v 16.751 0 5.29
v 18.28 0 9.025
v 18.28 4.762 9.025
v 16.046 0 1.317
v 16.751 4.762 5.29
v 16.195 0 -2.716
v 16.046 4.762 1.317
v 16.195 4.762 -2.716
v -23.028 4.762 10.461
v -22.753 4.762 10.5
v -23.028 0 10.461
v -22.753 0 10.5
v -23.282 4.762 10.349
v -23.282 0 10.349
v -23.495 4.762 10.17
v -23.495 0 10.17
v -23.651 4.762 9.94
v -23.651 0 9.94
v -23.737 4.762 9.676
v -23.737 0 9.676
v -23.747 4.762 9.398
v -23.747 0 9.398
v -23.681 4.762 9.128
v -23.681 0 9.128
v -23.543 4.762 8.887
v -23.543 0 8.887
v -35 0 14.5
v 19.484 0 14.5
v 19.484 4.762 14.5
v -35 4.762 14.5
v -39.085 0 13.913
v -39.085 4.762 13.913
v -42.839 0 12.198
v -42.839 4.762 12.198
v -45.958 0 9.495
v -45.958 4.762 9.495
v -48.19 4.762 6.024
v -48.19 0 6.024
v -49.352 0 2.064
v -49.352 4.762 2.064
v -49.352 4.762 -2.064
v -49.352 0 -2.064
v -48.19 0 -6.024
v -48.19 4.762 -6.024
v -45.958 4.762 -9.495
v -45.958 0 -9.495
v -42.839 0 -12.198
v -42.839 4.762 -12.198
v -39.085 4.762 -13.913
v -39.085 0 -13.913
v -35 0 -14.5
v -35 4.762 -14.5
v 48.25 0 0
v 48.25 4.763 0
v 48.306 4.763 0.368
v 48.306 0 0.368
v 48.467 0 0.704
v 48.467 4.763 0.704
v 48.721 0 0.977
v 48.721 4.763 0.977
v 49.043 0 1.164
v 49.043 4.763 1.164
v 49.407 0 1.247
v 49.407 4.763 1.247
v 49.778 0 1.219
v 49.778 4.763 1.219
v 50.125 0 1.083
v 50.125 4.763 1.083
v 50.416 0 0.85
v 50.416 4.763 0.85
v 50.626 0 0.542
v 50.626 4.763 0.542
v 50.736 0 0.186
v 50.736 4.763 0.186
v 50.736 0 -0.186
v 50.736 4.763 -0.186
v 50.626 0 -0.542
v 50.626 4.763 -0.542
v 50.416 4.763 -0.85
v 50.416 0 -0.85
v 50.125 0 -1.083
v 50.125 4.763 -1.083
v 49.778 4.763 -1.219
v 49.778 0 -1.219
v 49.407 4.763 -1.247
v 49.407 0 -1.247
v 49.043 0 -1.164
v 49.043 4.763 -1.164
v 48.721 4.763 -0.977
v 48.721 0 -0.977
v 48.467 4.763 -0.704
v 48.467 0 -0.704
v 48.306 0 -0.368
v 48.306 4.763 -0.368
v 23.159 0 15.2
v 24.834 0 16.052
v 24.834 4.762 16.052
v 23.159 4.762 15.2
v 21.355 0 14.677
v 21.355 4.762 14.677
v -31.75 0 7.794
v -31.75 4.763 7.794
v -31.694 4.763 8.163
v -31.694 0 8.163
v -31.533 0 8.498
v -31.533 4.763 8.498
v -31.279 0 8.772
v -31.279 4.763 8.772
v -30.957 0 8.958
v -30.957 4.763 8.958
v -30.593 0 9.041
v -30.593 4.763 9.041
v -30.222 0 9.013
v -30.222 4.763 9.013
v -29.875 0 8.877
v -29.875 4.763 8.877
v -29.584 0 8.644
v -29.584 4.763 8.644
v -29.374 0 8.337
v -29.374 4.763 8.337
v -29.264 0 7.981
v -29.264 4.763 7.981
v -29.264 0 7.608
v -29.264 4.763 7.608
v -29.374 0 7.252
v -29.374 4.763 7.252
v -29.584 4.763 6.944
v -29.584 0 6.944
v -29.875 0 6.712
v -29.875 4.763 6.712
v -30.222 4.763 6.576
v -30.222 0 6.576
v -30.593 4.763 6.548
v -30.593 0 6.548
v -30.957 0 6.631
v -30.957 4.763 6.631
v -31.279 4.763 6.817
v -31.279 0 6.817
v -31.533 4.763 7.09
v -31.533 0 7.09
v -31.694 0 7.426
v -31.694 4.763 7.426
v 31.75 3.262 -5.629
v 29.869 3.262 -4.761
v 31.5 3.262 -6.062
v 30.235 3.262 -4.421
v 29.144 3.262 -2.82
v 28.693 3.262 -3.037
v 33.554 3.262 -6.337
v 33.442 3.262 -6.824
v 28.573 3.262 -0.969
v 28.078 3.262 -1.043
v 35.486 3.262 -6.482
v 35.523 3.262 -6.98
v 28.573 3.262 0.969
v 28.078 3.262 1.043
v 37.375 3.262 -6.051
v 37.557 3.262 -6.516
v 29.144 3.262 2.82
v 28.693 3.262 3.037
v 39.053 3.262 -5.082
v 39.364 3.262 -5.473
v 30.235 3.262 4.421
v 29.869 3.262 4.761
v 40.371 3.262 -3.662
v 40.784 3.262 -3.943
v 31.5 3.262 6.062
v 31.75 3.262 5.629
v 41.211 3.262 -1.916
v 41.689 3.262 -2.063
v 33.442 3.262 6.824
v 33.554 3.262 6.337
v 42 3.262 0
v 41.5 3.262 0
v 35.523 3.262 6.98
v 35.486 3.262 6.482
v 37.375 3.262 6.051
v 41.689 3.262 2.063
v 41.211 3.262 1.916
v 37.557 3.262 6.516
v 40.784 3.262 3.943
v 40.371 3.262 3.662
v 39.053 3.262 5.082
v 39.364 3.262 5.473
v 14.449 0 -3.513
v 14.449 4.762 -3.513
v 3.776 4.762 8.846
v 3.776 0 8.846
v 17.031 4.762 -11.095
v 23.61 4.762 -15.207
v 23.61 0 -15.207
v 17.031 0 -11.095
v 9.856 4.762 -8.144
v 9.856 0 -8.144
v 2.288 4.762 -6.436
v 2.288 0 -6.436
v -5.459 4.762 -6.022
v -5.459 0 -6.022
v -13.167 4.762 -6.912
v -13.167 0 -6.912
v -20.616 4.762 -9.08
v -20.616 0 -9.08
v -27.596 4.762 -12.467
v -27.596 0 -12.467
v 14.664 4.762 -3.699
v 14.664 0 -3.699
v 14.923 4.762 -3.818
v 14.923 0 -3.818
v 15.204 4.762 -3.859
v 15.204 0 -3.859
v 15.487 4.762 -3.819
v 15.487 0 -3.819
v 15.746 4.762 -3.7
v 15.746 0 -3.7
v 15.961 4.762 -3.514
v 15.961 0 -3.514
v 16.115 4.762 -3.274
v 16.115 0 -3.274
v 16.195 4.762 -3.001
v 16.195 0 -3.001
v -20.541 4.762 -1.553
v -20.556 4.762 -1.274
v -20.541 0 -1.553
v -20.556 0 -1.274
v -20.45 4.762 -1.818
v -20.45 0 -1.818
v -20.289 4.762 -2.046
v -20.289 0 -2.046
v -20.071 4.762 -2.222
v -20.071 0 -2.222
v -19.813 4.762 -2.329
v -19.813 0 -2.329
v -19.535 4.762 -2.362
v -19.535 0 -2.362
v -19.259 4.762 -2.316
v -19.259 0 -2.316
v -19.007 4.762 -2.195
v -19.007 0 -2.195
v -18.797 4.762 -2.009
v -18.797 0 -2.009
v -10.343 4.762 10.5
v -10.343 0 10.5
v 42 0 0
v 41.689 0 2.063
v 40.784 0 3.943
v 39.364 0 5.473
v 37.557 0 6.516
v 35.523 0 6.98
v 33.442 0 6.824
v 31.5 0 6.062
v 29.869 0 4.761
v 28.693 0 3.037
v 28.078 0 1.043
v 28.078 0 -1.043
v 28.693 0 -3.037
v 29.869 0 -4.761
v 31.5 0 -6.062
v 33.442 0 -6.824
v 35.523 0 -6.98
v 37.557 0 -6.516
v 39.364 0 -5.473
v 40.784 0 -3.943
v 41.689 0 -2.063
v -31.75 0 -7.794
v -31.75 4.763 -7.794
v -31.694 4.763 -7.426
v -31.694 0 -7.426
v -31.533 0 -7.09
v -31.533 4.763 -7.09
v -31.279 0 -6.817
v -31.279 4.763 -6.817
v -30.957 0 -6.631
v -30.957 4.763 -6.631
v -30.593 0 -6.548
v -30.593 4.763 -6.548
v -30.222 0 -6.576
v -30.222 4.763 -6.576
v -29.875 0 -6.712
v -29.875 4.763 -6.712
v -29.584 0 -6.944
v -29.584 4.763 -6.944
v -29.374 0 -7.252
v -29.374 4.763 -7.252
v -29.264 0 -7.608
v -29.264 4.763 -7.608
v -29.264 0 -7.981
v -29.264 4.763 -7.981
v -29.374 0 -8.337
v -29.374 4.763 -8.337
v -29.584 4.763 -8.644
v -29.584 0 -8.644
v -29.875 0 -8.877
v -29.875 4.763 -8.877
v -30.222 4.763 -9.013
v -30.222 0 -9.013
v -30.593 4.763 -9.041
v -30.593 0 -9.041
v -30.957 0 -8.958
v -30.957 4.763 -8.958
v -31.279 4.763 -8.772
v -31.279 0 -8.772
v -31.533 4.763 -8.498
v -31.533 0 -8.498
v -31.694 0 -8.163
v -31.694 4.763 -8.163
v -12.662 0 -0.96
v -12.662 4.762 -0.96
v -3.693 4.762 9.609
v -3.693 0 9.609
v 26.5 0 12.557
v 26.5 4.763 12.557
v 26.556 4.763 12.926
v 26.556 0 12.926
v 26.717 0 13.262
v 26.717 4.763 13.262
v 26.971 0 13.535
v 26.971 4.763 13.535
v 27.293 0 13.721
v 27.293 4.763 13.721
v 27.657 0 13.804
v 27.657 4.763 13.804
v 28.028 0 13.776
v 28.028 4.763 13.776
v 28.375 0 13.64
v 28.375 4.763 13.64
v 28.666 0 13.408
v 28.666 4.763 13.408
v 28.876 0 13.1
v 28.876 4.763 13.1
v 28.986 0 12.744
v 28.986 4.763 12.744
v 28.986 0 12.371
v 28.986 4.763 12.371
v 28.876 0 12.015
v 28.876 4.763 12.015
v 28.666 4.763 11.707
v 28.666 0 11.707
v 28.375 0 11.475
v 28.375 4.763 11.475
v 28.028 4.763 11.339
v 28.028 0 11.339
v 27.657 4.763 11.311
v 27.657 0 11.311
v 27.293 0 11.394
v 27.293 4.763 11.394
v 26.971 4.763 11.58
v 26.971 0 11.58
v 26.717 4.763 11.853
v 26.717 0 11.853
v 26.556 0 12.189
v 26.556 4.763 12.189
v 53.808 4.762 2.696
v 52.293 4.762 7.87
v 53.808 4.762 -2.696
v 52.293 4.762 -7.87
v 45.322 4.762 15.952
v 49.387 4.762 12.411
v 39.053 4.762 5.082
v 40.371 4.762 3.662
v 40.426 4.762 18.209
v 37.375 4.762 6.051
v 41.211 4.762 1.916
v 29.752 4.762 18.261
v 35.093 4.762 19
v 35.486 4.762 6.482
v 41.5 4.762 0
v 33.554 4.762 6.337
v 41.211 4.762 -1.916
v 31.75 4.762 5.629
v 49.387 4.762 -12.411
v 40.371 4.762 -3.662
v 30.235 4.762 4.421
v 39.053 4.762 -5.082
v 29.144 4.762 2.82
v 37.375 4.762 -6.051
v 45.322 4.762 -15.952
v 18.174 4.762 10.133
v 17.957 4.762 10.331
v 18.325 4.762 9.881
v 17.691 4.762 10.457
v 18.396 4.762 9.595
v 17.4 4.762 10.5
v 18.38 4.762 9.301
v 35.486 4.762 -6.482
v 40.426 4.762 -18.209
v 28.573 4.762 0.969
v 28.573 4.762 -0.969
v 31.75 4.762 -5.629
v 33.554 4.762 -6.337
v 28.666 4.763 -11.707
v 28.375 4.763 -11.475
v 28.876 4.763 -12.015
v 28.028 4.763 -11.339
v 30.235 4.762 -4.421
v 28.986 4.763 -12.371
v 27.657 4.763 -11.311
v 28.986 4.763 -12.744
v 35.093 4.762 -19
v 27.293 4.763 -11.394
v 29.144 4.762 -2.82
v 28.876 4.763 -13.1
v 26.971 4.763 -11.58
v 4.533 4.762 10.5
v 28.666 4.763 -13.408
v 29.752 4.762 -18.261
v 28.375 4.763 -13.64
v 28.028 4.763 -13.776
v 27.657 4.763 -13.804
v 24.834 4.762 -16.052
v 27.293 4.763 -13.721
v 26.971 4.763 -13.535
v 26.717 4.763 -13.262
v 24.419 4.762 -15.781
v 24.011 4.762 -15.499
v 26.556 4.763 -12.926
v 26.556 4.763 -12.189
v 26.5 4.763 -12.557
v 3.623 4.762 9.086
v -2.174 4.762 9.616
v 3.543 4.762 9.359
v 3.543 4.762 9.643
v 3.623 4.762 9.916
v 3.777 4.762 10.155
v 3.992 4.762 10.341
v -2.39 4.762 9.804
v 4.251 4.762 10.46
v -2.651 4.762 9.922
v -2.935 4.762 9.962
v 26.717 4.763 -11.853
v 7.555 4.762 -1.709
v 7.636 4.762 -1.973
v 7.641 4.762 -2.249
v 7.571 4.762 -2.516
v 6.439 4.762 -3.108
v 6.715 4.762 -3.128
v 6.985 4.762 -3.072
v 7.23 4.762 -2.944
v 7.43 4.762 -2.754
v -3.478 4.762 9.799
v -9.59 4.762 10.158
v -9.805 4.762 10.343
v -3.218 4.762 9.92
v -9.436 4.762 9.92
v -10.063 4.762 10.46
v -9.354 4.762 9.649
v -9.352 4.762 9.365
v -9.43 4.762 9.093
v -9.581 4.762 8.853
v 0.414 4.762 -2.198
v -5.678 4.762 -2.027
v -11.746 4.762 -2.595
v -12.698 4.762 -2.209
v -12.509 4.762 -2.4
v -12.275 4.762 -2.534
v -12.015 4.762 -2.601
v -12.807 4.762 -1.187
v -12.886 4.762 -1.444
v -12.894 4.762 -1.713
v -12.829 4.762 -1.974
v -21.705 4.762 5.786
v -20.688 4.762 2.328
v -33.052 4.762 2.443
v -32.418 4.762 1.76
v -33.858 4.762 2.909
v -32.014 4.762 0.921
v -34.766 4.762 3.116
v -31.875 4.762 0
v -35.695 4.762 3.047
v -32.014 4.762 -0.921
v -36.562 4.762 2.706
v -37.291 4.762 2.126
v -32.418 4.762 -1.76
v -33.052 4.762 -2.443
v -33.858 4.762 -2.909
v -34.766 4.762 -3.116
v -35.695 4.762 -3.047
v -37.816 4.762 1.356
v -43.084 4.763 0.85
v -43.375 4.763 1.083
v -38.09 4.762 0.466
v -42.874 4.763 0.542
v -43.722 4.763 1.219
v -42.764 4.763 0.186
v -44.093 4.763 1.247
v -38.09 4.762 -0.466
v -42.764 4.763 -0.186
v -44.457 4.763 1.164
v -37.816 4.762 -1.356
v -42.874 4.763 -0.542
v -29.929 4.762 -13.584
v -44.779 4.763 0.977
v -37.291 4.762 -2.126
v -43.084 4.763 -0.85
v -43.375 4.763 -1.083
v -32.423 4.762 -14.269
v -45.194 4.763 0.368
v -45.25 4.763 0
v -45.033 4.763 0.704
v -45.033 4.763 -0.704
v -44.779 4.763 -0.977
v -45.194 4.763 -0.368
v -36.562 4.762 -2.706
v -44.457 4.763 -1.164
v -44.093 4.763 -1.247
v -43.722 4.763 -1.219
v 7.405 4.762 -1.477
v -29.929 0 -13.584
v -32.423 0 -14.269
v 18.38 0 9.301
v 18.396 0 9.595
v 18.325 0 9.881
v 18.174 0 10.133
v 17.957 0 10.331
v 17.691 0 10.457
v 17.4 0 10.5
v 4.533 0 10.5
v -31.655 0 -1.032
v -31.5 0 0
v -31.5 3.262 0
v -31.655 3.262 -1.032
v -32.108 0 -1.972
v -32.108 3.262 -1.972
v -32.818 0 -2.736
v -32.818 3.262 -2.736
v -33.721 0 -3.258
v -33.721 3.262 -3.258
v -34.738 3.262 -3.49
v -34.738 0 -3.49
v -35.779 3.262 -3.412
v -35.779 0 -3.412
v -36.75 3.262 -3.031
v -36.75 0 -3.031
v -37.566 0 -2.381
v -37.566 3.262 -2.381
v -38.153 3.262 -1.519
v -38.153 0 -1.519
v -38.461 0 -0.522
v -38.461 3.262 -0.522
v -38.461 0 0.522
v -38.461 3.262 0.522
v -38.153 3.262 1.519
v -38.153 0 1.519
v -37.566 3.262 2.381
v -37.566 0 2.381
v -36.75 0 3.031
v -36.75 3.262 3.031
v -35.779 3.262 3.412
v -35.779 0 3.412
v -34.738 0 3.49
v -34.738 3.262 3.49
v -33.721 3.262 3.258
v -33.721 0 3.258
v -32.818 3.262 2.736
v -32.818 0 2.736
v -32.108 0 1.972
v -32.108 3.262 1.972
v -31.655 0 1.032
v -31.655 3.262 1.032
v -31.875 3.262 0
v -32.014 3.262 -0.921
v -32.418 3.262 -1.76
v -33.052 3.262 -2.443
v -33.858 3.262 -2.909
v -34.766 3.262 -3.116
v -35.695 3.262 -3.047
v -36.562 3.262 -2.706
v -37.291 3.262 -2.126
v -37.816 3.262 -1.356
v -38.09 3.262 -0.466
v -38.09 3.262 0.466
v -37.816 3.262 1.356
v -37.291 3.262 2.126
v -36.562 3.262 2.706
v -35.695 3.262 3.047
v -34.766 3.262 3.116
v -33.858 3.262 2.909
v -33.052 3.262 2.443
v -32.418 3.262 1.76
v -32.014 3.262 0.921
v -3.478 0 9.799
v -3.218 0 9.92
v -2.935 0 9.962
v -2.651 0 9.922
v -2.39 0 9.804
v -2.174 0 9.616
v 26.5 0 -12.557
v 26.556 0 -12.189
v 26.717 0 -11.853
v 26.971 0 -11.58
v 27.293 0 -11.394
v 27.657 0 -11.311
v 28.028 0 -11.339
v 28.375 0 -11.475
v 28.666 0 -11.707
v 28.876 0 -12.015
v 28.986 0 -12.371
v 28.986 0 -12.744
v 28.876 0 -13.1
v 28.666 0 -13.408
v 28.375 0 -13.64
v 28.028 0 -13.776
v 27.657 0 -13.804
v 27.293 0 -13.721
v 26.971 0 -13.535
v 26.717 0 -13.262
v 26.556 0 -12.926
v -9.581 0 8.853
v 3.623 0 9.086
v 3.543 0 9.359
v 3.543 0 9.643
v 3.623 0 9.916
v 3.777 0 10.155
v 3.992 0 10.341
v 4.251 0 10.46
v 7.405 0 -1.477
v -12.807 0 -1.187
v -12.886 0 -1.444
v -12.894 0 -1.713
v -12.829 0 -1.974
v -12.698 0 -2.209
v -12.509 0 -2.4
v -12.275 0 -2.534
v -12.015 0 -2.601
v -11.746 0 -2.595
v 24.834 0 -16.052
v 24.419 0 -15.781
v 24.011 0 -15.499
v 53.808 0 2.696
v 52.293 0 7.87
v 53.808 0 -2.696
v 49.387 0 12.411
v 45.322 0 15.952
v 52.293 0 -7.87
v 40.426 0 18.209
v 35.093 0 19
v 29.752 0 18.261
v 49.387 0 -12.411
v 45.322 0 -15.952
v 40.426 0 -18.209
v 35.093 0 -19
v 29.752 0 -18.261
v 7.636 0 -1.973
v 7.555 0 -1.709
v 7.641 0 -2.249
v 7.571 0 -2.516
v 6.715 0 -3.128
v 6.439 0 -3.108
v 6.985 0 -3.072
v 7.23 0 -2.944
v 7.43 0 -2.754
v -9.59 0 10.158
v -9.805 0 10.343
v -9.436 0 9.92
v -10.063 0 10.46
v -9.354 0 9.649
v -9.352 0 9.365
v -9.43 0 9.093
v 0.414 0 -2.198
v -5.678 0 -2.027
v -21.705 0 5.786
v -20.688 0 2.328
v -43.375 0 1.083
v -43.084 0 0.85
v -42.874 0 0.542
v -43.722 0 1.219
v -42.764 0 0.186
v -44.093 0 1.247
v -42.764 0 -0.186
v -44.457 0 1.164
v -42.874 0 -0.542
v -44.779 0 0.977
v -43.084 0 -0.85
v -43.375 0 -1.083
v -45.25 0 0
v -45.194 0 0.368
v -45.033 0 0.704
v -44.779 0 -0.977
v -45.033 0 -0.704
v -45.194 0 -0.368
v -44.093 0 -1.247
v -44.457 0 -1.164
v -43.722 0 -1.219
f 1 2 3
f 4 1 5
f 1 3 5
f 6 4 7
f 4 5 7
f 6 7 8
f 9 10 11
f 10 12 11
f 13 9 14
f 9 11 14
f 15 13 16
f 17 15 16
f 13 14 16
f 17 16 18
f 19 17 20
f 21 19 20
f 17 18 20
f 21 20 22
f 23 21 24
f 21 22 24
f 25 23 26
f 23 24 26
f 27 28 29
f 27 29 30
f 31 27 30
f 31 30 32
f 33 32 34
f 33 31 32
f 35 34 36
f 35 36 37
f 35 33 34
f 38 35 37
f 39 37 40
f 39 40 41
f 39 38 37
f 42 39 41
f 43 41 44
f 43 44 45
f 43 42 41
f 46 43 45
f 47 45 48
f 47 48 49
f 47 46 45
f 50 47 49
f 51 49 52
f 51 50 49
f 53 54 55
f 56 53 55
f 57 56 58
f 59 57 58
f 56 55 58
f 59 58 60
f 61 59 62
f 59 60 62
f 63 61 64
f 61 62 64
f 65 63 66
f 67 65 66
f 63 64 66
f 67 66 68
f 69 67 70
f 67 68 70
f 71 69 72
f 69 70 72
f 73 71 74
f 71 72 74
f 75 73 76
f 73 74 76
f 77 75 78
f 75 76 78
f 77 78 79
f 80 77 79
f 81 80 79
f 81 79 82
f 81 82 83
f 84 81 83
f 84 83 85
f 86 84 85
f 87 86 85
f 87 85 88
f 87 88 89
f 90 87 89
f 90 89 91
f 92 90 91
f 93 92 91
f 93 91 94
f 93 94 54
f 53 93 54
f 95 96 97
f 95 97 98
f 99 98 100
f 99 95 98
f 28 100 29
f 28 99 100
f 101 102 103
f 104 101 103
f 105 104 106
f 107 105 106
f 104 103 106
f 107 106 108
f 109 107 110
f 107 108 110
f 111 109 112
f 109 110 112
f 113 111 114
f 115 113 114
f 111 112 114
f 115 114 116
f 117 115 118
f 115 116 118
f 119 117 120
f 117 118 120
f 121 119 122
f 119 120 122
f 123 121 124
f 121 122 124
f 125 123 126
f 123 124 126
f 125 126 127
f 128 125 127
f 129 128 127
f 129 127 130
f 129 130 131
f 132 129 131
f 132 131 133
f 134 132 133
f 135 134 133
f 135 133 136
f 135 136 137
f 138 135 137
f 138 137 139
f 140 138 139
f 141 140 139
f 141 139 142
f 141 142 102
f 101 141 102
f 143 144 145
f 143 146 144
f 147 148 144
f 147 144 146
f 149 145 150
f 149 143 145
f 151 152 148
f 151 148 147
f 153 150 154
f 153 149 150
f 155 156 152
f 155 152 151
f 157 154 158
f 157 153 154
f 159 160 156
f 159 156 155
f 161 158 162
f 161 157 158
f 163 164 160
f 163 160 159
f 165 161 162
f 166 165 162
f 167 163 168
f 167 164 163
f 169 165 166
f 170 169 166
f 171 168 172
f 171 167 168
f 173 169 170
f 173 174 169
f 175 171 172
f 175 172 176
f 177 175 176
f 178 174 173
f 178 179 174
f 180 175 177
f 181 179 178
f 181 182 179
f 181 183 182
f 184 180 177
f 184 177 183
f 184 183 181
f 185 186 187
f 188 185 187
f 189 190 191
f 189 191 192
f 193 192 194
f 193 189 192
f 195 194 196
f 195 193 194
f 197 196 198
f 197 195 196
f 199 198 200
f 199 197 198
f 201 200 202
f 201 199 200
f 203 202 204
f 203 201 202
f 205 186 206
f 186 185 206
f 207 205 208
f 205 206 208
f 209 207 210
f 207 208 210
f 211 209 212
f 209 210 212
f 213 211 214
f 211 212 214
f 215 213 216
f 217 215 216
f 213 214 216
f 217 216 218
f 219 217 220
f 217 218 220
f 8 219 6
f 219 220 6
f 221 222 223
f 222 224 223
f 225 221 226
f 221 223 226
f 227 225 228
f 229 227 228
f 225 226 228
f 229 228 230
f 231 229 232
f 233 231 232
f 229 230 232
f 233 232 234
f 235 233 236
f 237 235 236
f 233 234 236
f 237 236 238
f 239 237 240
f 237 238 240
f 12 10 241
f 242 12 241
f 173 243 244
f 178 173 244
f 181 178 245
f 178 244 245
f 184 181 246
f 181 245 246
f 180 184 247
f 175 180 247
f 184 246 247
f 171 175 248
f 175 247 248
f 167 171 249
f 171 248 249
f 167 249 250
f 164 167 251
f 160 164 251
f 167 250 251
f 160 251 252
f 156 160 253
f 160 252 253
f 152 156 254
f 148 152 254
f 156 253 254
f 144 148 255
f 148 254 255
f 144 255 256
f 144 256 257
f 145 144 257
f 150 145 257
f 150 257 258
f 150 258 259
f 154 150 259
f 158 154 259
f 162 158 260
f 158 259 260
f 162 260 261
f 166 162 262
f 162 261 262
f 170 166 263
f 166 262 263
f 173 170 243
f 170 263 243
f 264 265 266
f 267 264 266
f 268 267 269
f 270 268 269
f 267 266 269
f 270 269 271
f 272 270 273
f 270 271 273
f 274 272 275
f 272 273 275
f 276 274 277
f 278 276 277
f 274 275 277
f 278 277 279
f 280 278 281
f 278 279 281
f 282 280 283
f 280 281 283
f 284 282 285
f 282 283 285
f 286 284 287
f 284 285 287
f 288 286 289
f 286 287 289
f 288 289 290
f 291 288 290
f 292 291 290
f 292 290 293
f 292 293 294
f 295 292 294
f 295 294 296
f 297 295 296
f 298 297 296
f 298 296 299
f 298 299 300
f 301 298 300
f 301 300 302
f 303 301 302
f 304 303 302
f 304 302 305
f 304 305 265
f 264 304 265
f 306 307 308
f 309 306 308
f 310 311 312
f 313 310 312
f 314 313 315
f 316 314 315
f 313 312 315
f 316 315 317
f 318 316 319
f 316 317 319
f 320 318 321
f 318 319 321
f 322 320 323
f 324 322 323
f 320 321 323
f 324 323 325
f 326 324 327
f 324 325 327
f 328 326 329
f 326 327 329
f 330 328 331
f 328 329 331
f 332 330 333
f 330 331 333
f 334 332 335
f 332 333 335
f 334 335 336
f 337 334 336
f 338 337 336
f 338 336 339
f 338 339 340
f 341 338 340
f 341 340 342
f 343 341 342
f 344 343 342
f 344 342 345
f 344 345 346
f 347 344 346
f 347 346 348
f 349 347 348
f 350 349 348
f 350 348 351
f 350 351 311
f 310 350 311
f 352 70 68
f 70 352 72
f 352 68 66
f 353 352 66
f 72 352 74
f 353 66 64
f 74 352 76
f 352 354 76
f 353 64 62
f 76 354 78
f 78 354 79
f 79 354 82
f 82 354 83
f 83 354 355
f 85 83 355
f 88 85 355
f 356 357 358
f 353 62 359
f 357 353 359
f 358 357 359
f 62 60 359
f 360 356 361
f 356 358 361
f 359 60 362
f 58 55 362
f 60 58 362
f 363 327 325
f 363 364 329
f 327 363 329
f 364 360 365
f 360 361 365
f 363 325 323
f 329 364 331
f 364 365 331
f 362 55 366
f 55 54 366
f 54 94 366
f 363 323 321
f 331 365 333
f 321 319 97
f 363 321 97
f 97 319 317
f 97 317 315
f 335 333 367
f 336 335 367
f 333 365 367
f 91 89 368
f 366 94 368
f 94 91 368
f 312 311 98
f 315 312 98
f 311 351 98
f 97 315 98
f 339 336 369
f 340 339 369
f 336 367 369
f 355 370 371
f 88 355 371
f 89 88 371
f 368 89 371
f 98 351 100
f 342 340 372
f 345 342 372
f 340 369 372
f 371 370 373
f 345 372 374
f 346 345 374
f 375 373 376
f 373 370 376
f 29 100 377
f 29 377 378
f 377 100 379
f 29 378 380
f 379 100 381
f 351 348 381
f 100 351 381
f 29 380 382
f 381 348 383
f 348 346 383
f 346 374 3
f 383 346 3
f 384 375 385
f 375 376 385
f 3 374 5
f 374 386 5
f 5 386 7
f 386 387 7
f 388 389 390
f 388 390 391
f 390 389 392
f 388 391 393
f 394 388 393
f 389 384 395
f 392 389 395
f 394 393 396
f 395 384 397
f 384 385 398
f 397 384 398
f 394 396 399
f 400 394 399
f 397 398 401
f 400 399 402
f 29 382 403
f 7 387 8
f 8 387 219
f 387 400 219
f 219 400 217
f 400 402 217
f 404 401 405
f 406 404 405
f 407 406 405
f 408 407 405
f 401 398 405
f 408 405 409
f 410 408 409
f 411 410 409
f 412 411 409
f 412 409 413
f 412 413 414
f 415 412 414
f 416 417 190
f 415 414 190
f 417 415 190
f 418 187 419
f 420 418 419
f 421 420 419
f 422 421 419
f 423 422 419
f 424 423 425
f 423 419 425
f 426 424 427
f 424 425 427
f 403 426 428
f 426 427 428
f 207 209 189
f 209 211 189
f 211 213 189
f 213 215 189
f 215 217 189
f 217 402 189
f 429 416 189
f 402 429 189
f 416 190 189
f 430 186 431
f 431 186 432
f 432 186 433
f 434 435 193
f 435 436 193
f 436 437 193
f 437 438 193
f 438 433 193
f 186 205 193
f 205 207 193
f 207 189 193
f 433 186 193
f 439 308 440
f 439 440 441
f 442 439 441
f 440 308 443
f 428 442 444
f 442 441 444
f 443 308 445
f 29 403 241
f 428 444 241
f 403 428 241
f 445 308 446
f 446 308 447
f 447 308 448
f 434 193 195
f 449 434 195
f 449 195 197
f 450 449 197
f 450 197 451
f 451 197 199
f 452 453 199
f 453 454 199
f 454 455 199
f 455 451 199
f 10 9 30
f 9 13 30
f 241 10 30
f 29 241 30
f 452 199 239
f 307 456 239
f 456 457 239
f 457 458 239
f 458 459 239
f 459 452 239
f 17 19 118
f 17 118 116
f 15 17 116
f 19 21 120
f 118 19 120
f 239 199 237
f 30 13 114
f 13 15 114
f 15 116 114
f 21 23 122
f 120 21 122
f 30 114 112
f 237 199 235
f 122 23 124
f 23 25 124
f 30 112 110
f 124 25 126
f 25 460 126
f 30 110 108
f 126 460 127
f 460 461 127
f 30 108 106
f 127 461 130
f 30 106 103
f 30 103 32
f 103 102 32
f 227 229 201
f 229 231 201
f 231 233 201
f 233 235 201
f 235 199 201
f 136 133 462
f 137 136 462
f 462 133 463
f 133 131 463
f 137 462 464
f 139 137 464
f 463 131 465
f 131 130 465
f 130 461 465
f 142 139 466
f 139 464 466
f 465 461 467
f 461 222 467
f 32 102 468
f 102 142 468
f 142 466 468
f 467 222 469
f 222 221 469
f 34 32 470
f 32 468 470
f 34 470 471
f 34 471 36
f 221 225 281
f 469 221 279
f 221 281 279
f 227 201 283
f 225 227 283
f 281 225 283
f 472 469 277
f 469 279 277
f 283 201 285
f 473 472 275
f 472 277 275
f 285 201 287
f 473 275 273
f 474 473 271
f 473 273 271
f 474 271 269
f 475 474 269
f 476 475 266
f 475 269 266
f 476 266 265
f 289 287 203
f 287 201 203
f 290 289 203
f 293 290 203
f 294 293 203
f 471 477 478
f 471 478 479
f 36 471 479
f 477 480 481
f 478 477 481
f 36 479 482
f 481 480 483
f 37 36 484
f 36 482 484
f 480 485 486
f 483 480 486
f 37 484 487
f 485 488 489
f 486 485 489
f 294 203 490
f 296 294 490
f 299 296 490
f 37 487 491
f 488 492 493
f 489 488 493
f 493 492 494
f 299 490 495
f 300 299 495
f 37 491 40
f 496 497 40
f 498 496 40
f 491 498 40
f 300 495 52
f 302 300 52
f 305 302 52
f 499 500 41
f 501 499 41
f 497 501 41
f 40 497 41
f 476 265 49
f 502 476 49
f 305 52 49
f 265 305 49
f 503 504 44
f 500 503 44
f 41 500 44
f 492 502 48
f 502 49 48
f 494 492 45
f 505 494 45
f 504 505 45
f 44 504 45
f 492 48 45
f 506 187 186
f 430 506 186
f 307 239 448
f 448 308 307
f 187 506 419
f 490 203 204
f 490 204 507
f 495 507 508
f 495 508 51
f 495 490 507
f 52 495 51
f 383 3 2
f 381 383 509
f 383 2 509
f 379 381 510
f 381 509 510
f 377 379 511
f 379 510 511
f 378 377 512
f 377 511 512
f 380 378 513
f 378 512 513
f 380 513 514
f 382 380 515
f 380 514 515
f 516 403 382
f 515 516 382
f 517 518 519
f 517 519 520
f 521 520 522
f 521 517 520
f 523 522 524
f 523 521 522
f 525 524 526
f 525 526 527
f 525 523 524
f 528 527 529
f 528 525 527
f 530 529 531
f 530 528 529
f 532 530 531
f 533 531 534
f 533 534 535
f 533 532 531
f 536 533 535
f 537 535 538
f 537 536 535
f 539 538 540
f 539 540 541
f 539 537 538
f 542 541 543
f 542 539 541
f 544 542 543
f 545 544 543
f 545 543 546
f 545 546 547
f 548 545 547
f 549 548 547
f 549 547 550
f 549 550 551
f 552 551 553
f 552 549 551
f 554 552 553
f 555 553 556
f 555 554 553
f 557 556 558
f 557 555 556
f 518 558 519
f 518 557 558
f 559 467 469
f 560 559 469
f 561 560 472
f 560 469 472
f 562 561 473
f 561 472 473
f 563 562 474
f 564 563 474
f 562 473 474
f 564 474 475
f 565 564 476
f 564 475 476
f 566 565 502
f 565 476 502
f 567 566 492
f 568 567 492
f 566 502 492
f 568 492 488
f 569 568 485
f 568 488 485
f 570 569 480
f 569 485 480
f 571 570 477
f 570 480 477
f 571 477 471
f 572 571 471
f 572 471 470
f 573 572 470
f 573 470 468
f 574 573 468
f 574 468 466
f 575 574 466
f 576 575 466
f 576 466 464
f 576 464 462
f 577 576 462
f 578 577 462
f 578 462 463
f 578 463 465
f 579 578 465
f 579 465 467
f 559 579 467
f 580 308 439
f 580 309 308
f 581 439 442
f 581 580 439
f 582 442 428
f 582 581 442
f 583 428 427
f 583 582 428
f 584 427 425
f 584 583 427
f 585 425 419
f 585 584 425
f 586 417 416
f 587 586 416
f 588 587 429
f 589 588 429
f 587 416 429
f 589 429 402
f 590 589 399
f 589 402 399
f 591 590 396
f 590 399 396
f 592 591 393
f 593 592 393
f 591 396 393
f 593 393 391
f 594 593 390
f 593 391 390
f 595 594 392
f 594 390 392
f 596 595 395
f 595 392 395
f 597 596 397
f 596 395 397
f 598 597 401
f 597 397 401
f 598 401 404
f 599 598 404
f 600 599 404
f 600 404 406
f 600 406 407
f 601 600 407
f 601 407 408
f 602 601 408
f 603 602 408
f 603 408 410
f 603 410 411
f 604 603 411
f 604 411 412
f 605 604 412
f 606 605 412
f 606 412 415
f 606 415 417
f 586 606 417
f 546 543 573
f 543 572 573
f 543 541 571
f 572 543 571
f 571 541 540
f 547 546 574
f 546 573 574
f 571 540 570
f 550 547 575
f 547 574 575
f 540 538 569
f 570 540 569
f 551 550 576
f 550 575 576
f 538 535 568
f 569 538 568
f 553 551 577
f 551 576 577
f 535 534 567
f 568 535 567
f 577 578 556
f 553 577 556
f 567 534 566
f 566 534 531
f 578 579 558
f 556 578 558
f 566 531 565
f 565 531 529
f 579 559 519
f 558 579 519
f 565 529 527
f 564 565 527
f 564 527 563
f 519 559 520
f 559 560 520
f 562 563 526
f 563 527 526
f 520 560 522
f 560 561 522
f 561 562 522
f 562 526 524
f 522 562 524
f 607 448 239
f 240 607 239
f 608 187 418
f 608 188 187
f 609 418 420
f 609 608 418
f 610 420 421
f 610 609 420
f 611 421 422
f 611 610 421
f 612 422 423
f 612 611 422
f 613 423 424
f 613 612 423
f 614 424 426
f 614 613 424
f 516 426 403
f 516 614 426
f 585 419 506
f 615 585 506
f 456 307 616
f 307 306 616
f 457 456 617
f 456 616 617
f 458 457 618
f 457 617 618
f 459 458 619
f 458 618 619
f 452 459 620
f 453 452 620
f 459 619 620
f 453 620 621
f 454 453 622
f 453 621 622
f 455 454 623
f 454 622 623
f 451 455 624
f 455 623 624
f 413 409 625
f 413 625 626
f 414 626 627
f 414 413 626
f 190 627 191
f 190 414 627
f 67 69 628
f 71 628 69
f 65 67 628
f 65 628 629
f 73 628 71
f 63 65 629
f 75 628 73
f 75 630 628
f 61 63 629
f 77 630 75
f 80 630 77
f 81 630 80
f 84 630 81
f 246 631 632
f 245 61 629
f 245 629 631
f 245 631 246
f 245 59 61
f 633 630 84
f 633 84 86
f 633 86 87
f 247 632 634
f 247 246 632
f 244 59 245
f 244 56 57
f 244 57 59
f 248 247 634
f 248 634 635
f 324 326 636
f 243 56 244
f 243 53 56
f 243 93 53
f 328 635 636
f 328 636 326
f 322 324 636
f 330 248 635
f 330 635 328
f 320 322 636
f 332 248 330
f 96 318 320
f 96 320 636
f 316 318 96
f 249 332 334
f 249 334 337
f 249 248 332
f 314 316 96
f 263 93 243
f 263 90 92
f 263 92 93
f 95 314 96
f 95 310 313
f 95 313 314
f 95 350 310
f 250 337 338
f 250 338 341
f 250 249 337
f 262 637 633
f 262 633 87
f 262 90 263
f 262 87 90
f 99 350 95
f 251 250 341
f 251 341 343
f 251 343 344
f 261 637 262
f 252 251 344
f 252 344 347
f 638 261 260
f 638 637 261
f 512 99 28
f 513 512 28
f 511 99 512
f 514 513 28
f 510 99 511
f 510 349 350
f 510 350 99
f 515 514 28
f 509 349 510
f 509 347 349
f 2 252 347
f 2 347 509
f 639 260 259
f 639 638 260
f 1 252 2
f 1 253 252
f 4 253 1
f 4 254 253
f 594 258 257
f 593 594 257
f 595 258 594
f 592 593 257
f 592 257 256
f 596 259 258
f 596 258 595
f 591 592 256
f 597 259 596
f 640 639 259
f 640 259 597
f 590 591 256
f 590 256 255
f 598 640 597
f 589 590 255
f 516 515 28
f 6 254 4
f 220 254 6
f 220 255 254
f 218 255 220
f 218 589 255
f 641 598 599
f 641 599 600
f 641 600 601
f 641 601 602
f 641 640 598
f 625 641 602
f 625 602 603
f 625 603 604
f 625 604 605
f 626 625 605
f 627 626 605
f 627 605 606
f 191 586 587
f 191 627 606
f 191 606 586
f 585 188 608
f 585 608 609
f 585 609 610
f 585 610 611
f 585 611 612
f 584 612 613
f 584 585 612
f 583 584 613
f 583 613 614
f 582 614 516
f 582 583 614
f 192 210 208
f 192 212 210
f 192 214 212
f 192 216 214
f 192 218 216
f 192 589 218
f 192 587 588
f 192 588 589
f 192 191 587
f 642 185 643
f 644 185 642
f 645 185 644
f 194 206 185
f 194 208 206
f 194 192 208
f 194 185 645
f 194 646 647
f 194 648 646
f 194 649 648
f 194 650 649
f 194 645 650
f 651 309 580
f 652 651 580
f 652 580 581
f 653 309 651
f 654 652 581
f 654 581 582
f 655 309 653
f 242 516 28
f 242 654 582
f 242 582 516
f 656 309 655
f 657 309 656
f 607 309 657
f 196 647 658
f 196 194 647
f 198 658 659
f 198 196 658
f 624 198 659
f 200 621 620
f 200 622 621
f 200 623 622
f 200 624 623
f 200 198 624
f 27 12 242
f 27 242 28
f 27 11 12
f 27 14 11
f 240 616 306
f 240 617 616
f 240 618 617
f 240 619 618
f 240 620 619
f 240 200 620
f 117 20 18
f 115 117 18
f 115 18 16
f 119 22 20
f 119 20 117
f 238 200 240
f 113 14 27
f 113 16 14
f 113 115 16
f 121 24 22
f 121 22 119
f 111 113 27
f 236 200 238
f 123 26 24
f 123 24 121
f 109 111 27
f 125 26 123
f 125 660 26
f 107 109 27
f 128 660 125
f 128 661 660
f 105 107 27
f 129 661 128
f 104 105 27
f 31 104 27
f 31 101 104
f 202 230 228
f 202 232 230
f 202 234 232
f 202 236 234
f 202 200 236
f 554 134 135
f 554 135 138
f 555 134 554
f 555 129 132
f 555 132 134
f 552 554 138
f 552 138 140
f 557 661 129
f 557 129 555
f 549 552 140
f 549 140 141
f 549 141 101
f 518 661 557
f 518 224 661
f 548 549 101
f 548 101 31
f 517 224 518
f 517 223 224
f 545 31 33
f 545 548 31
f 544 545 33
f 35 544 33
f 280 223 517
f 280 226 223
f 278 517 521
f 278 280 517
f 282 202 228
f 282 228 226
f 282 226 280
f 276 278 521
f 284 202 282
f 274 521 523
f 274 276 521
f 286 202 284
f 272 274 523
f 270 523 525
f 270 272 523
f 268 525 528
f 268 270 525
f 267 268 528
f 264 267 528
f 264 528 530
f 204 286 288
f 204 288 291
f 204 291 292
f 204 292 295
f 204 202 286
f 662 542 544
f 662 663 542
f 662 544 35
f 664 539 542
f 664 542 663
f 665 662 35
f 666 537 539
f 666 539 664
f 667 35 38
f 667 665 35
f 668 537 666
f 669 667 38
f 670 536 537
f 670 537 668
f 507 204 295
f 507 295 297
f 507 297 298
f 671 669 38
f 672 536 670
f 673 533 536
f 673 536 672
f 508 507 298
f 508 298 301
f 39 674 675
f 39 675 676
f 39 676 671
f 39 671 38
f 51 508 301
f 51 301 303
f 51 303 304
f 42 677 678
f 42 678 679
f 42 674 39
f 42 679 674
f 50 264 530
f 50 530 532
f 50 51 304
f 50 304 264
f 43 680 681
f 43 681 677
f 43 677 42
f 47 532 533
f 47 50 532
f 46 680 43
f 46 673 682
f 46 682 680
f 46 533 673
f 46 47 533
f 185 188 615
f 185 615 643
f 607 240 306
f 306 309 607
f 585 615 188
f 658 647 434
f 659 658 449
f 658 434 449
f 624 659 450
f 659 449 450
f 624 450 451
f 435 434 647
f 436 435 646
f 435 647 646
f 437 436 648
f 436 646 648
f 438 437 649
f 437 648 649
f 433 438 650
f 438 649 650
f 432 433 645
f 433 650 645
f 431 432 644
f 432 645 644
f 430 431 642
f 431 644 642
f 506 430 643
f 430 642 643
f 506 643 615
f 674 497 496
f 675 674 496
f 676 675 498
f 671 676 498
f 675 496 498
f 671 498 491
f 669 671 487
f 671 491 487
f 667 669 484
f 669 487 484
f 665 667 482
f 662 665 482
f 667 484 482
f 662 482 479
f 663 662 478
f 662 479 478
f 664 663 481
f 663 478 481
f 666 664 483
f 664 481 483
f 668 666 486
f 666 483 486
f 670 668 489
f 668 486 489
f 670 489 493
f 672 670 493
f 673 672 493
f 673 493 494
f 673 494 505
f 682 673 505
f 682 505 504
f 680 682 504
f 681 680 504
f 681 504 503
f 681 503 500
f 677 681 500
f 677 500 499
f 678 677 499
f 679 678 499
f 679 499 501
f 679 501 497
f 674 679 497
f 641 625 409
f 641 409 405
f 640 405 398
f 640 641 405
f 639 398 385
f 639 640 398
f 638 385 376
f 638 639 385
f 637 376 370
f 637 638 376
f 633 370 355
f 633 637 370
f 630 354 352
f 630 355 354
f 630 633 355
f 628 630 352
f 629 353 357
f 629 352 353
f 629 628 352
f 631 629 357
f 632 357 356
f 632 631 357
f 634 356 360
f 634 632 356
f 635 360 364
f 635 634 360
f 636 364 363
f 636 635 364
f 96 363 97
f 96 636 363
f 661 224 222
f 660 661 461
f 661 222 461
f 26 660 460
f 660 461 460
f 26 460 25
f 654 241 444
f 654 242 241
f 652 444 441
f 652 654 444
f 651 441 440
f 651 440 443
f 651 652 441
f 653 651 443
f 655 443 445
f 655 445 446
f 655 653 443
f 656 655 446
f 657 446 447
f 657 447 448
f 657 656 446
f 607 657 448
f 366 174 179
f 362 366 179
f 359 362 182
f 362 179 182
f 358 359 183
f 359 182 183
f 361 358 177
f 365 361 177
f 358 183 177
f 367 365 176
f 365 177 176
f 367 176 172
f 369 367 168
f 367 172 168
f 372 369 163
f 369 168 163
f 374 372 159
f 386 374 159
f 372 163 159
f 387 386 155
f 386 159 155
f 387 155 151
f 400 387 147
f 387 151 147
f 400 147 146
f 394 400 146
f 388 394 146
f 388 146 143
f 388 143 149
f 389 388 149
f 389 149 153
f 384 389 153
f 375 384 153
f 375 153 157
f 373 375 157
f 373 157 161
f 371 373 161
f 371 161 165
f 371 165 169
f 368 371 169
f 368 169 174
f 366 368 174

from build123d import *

# Parameters (mm, degrees)
BOSS_EXTRUDE1_DEPTH   = 4.7625
CUT_EXTRUDE1_DEPTH    = 5.7625
CUT_EXTRUDE2_DEPTH    = 5.7625
FILLET1_R             = 1
SKETCH4_R             = 4
BOSS_EXTRUDE3_DEPTH   = 4.7625
SKETCH5_R             = 3.125
CUT_EXTRUDE3_DEPTH    = 5.7625
SKETCH6_R             = 3.5
CUT_EXTRUDE4_DEPTH    = 3.2625
SKETCH7_R             = 6.5
CUT_EXTRUDE5_DEPTH    = 5.7625
SKETCH8_R             = 7
CUT_EXTRUDE6_DEPTH    = 3.2625
M3X0_5_TAPPED_HOLE1_D = 2.5
M3X0_5_TAPPED_HOLE2_D = 2.5


with BuildPart() as part:
    # Sketch1 → Boss-Extrude1 (new body)
    with BuildSketch(Plane(origin=(0, 0, 0), x_dir=(1, 0, 0), z_dir=(0, 1, 0))):
        with BuildLine():
            Line((-35, 14.5), (19.483879351, 14.5))
            ThreePointArc((19.483879351, 14.5), (22.269309423, 14.89576243), (24.834265782, 16.051724138))
            ThreePointArc((24.834265782, 16.051724138), (54, 0), (24.834265782, -16.051724138))
            ThreePointArc((24.834265782, -16.051724138), (22.269309423, -14.89576243), (19.483879351, -14.5))
            Line((19.483879351, -14.5), (-35, -14.5))
            ThreePointArc((-35, -14.5), (-49.5, 0), (-35, 14.5))
        make_face()
    extrude(amount=BOSS_EXTRUDE1_DEPTH)

    # Sketch2 → Cut-Extrude1 (cut, through all)
    with BuildSketch(Plane(origin=(0, 4.7625, 0), x_dir=(1, 0, 0), z_dir=(0, 1, 0))):
        with BuildLine():
            Line((-35, 14.5), (27.609823933, 17.503865221))
            ThreePointArc((27.609823933, 17.503865221), (25.539879113, 16.477442544), (23.609823933, 15.207362991))
            ThreePointArc((23.609823933, 15.207362991), (-1.577083946, 6.065910022), (-27.59576752, 12.467050228))
            ThreePointArc((-27.59576752, 12.467050228), (-31.160874338, 13.98252889), (-35, 14.5))
        make_face()
    extrude(amount=-CUT_EXTRUDE1_DEPTH, mode=Mode.SUBTRACT)

    # Sketch3 → Cut-Extrude2 (cut, through all)
    with BuildSketch(Plane(origin=(0, 4.7625, 0), x_dir=(1, 0, 0), z_dir=(0, 1, 0))):
        with BuildLine():
            Line((-25, -10.5), (-8.18305643, -10.5))
            Line((-8.18305643, -10.5), (-21.431362429, 5.11293208))
            ThreePointArc((-21.431362429, 5.11293208), (-20.86454524, -3.230931556), (-25, -10.5))
        make_face()
        with BuildLine():
            Line((-14.47546762, 3.097845852), (-2.937056907, -10.5))
            Line((-2.937056907, -10.5), (9.456330798, 3.851674059))
            ThreePointArc((9.456330798, 3.851674059), (-2.463897631, 2.02484882), (-14.47546762, 3.097845852))
        make_face()
        with BuildLine():
            Line((17.235698957, 6.740148995), (2.347968808, -10.5))
            Line((2.347968808, -10.5), (19.164912378, -10.5))
            ThreePointArc((19.164912378, -10.5), (16.117854624, -2.112956696), (17.235698957, 6.740148995))
        make_face()
    extrude(amount=-CUT_EXTRUDE2_DEPTH, mode=Mode.SUBTRACT)

    # Fillet1
    fillet1_edges = [part.edges().sort_by_distance(p)[0] for p in [
        (17.235698957, 2.38125, -6.740148995),
        (19.164912378, 2.38125, 10.5),
        (2.347968808, 2.38125, 10.5),
        (-21.431362429, 2.38125, -5.11293208),
        (-8.18305643, 2.38125, 10.5),
        (-25, 2.38125, 10.5),
        (-14.47546762, 2.38125, -3.097845852),
        (9.456330798, 2.38125, -3.851674059),
        (-2.937056907, 2.38125, 10.5),
    ]]
    fillet(fillet1_edges, radius=FILLET1_R)

    # Sketch4 → Boss-Extrude3 (add, through all)
    with BuildSketch(Plane(origin=(0, 4.7625, 0), x_dir=(1, 0, 0), z_dir=(0, 1, 0))):
        with Locations((-35, 0)):
            Circle(SKETCH4_R)
    extrude(amount=-BOSS_EXTRUDE3_DEPTH)

    # Sketch5 → Cut-Extrude3 (cut, through all)
    with BuildSketch(Plane(origin=(0, 4.7625, 0), x_dir=(1, 0, 0), z_dir=(0, 1, 0))):
        with Locations((-35, 0)):
            Circle(SKETCH5_R)
    extrude(amount=-CUT_EXTRUDE3_DEPTH, mode=Mode.SUBTRACT)

    # Sketch6 → Cut-Extrude4 (cut)
    with BuildSketch(Plane(origin=(0, 0, 0), x_dir=(1, 0, 0), z_dir=(0, 1, 0))):
        with Locations((-35, 0)):
            Circle(SKETCH6_R)
    extrude(amount=CUT_EXTRUDE4_DEPTH, mode=Mode.SUBTRACT)

    # Sketch7 → Cut-Extrude5 (cut, through all)
    with BuildSketch(Plane.XZ):
        with Locations((35, 0)):
            Circle(SKETCH7_R)
    extrude(amount=-CUT_EXTRUDE5_DEPTH, mode=Mode.SUBTRACT)

    # Sketch8 → Cut-Extrude6 (cut)
    with BuildSketch(Plane.XZ):
        with Locations((35, 0)):
            Circle(SKETCH8_R)
    extrude(amount=-CUT_EXTRUDE6_DEPTH, mode=Mode.SUBTRACT)

    # M3x0.5 Tapped Hole1 (through all)
    with Locations(Plane.XZ):
        with Locations((27.75, -12.557368355), (27.75, 12.557368355), (49.5, 0), (-44, 0), (-30.5, 7.794228634), (-30.5, -7.794228634)):
            Hole(M3X0_5_TAPPED_HOLE1_D / 2)

    # M3x0.5 Tapped Hole2 (through all)
    with Locations(Plane(origin=(0, 4.7625, 0), x_dir=(-1, 0, 0), z_dir=(0, 1, 0))):
        with Locations((30.5, 7.794228634), (44, 0), (30.5, -7.794228634)):
            Hole(M3X0_5_TAPPED_HOLE2_D / 2)


solid = part.part
